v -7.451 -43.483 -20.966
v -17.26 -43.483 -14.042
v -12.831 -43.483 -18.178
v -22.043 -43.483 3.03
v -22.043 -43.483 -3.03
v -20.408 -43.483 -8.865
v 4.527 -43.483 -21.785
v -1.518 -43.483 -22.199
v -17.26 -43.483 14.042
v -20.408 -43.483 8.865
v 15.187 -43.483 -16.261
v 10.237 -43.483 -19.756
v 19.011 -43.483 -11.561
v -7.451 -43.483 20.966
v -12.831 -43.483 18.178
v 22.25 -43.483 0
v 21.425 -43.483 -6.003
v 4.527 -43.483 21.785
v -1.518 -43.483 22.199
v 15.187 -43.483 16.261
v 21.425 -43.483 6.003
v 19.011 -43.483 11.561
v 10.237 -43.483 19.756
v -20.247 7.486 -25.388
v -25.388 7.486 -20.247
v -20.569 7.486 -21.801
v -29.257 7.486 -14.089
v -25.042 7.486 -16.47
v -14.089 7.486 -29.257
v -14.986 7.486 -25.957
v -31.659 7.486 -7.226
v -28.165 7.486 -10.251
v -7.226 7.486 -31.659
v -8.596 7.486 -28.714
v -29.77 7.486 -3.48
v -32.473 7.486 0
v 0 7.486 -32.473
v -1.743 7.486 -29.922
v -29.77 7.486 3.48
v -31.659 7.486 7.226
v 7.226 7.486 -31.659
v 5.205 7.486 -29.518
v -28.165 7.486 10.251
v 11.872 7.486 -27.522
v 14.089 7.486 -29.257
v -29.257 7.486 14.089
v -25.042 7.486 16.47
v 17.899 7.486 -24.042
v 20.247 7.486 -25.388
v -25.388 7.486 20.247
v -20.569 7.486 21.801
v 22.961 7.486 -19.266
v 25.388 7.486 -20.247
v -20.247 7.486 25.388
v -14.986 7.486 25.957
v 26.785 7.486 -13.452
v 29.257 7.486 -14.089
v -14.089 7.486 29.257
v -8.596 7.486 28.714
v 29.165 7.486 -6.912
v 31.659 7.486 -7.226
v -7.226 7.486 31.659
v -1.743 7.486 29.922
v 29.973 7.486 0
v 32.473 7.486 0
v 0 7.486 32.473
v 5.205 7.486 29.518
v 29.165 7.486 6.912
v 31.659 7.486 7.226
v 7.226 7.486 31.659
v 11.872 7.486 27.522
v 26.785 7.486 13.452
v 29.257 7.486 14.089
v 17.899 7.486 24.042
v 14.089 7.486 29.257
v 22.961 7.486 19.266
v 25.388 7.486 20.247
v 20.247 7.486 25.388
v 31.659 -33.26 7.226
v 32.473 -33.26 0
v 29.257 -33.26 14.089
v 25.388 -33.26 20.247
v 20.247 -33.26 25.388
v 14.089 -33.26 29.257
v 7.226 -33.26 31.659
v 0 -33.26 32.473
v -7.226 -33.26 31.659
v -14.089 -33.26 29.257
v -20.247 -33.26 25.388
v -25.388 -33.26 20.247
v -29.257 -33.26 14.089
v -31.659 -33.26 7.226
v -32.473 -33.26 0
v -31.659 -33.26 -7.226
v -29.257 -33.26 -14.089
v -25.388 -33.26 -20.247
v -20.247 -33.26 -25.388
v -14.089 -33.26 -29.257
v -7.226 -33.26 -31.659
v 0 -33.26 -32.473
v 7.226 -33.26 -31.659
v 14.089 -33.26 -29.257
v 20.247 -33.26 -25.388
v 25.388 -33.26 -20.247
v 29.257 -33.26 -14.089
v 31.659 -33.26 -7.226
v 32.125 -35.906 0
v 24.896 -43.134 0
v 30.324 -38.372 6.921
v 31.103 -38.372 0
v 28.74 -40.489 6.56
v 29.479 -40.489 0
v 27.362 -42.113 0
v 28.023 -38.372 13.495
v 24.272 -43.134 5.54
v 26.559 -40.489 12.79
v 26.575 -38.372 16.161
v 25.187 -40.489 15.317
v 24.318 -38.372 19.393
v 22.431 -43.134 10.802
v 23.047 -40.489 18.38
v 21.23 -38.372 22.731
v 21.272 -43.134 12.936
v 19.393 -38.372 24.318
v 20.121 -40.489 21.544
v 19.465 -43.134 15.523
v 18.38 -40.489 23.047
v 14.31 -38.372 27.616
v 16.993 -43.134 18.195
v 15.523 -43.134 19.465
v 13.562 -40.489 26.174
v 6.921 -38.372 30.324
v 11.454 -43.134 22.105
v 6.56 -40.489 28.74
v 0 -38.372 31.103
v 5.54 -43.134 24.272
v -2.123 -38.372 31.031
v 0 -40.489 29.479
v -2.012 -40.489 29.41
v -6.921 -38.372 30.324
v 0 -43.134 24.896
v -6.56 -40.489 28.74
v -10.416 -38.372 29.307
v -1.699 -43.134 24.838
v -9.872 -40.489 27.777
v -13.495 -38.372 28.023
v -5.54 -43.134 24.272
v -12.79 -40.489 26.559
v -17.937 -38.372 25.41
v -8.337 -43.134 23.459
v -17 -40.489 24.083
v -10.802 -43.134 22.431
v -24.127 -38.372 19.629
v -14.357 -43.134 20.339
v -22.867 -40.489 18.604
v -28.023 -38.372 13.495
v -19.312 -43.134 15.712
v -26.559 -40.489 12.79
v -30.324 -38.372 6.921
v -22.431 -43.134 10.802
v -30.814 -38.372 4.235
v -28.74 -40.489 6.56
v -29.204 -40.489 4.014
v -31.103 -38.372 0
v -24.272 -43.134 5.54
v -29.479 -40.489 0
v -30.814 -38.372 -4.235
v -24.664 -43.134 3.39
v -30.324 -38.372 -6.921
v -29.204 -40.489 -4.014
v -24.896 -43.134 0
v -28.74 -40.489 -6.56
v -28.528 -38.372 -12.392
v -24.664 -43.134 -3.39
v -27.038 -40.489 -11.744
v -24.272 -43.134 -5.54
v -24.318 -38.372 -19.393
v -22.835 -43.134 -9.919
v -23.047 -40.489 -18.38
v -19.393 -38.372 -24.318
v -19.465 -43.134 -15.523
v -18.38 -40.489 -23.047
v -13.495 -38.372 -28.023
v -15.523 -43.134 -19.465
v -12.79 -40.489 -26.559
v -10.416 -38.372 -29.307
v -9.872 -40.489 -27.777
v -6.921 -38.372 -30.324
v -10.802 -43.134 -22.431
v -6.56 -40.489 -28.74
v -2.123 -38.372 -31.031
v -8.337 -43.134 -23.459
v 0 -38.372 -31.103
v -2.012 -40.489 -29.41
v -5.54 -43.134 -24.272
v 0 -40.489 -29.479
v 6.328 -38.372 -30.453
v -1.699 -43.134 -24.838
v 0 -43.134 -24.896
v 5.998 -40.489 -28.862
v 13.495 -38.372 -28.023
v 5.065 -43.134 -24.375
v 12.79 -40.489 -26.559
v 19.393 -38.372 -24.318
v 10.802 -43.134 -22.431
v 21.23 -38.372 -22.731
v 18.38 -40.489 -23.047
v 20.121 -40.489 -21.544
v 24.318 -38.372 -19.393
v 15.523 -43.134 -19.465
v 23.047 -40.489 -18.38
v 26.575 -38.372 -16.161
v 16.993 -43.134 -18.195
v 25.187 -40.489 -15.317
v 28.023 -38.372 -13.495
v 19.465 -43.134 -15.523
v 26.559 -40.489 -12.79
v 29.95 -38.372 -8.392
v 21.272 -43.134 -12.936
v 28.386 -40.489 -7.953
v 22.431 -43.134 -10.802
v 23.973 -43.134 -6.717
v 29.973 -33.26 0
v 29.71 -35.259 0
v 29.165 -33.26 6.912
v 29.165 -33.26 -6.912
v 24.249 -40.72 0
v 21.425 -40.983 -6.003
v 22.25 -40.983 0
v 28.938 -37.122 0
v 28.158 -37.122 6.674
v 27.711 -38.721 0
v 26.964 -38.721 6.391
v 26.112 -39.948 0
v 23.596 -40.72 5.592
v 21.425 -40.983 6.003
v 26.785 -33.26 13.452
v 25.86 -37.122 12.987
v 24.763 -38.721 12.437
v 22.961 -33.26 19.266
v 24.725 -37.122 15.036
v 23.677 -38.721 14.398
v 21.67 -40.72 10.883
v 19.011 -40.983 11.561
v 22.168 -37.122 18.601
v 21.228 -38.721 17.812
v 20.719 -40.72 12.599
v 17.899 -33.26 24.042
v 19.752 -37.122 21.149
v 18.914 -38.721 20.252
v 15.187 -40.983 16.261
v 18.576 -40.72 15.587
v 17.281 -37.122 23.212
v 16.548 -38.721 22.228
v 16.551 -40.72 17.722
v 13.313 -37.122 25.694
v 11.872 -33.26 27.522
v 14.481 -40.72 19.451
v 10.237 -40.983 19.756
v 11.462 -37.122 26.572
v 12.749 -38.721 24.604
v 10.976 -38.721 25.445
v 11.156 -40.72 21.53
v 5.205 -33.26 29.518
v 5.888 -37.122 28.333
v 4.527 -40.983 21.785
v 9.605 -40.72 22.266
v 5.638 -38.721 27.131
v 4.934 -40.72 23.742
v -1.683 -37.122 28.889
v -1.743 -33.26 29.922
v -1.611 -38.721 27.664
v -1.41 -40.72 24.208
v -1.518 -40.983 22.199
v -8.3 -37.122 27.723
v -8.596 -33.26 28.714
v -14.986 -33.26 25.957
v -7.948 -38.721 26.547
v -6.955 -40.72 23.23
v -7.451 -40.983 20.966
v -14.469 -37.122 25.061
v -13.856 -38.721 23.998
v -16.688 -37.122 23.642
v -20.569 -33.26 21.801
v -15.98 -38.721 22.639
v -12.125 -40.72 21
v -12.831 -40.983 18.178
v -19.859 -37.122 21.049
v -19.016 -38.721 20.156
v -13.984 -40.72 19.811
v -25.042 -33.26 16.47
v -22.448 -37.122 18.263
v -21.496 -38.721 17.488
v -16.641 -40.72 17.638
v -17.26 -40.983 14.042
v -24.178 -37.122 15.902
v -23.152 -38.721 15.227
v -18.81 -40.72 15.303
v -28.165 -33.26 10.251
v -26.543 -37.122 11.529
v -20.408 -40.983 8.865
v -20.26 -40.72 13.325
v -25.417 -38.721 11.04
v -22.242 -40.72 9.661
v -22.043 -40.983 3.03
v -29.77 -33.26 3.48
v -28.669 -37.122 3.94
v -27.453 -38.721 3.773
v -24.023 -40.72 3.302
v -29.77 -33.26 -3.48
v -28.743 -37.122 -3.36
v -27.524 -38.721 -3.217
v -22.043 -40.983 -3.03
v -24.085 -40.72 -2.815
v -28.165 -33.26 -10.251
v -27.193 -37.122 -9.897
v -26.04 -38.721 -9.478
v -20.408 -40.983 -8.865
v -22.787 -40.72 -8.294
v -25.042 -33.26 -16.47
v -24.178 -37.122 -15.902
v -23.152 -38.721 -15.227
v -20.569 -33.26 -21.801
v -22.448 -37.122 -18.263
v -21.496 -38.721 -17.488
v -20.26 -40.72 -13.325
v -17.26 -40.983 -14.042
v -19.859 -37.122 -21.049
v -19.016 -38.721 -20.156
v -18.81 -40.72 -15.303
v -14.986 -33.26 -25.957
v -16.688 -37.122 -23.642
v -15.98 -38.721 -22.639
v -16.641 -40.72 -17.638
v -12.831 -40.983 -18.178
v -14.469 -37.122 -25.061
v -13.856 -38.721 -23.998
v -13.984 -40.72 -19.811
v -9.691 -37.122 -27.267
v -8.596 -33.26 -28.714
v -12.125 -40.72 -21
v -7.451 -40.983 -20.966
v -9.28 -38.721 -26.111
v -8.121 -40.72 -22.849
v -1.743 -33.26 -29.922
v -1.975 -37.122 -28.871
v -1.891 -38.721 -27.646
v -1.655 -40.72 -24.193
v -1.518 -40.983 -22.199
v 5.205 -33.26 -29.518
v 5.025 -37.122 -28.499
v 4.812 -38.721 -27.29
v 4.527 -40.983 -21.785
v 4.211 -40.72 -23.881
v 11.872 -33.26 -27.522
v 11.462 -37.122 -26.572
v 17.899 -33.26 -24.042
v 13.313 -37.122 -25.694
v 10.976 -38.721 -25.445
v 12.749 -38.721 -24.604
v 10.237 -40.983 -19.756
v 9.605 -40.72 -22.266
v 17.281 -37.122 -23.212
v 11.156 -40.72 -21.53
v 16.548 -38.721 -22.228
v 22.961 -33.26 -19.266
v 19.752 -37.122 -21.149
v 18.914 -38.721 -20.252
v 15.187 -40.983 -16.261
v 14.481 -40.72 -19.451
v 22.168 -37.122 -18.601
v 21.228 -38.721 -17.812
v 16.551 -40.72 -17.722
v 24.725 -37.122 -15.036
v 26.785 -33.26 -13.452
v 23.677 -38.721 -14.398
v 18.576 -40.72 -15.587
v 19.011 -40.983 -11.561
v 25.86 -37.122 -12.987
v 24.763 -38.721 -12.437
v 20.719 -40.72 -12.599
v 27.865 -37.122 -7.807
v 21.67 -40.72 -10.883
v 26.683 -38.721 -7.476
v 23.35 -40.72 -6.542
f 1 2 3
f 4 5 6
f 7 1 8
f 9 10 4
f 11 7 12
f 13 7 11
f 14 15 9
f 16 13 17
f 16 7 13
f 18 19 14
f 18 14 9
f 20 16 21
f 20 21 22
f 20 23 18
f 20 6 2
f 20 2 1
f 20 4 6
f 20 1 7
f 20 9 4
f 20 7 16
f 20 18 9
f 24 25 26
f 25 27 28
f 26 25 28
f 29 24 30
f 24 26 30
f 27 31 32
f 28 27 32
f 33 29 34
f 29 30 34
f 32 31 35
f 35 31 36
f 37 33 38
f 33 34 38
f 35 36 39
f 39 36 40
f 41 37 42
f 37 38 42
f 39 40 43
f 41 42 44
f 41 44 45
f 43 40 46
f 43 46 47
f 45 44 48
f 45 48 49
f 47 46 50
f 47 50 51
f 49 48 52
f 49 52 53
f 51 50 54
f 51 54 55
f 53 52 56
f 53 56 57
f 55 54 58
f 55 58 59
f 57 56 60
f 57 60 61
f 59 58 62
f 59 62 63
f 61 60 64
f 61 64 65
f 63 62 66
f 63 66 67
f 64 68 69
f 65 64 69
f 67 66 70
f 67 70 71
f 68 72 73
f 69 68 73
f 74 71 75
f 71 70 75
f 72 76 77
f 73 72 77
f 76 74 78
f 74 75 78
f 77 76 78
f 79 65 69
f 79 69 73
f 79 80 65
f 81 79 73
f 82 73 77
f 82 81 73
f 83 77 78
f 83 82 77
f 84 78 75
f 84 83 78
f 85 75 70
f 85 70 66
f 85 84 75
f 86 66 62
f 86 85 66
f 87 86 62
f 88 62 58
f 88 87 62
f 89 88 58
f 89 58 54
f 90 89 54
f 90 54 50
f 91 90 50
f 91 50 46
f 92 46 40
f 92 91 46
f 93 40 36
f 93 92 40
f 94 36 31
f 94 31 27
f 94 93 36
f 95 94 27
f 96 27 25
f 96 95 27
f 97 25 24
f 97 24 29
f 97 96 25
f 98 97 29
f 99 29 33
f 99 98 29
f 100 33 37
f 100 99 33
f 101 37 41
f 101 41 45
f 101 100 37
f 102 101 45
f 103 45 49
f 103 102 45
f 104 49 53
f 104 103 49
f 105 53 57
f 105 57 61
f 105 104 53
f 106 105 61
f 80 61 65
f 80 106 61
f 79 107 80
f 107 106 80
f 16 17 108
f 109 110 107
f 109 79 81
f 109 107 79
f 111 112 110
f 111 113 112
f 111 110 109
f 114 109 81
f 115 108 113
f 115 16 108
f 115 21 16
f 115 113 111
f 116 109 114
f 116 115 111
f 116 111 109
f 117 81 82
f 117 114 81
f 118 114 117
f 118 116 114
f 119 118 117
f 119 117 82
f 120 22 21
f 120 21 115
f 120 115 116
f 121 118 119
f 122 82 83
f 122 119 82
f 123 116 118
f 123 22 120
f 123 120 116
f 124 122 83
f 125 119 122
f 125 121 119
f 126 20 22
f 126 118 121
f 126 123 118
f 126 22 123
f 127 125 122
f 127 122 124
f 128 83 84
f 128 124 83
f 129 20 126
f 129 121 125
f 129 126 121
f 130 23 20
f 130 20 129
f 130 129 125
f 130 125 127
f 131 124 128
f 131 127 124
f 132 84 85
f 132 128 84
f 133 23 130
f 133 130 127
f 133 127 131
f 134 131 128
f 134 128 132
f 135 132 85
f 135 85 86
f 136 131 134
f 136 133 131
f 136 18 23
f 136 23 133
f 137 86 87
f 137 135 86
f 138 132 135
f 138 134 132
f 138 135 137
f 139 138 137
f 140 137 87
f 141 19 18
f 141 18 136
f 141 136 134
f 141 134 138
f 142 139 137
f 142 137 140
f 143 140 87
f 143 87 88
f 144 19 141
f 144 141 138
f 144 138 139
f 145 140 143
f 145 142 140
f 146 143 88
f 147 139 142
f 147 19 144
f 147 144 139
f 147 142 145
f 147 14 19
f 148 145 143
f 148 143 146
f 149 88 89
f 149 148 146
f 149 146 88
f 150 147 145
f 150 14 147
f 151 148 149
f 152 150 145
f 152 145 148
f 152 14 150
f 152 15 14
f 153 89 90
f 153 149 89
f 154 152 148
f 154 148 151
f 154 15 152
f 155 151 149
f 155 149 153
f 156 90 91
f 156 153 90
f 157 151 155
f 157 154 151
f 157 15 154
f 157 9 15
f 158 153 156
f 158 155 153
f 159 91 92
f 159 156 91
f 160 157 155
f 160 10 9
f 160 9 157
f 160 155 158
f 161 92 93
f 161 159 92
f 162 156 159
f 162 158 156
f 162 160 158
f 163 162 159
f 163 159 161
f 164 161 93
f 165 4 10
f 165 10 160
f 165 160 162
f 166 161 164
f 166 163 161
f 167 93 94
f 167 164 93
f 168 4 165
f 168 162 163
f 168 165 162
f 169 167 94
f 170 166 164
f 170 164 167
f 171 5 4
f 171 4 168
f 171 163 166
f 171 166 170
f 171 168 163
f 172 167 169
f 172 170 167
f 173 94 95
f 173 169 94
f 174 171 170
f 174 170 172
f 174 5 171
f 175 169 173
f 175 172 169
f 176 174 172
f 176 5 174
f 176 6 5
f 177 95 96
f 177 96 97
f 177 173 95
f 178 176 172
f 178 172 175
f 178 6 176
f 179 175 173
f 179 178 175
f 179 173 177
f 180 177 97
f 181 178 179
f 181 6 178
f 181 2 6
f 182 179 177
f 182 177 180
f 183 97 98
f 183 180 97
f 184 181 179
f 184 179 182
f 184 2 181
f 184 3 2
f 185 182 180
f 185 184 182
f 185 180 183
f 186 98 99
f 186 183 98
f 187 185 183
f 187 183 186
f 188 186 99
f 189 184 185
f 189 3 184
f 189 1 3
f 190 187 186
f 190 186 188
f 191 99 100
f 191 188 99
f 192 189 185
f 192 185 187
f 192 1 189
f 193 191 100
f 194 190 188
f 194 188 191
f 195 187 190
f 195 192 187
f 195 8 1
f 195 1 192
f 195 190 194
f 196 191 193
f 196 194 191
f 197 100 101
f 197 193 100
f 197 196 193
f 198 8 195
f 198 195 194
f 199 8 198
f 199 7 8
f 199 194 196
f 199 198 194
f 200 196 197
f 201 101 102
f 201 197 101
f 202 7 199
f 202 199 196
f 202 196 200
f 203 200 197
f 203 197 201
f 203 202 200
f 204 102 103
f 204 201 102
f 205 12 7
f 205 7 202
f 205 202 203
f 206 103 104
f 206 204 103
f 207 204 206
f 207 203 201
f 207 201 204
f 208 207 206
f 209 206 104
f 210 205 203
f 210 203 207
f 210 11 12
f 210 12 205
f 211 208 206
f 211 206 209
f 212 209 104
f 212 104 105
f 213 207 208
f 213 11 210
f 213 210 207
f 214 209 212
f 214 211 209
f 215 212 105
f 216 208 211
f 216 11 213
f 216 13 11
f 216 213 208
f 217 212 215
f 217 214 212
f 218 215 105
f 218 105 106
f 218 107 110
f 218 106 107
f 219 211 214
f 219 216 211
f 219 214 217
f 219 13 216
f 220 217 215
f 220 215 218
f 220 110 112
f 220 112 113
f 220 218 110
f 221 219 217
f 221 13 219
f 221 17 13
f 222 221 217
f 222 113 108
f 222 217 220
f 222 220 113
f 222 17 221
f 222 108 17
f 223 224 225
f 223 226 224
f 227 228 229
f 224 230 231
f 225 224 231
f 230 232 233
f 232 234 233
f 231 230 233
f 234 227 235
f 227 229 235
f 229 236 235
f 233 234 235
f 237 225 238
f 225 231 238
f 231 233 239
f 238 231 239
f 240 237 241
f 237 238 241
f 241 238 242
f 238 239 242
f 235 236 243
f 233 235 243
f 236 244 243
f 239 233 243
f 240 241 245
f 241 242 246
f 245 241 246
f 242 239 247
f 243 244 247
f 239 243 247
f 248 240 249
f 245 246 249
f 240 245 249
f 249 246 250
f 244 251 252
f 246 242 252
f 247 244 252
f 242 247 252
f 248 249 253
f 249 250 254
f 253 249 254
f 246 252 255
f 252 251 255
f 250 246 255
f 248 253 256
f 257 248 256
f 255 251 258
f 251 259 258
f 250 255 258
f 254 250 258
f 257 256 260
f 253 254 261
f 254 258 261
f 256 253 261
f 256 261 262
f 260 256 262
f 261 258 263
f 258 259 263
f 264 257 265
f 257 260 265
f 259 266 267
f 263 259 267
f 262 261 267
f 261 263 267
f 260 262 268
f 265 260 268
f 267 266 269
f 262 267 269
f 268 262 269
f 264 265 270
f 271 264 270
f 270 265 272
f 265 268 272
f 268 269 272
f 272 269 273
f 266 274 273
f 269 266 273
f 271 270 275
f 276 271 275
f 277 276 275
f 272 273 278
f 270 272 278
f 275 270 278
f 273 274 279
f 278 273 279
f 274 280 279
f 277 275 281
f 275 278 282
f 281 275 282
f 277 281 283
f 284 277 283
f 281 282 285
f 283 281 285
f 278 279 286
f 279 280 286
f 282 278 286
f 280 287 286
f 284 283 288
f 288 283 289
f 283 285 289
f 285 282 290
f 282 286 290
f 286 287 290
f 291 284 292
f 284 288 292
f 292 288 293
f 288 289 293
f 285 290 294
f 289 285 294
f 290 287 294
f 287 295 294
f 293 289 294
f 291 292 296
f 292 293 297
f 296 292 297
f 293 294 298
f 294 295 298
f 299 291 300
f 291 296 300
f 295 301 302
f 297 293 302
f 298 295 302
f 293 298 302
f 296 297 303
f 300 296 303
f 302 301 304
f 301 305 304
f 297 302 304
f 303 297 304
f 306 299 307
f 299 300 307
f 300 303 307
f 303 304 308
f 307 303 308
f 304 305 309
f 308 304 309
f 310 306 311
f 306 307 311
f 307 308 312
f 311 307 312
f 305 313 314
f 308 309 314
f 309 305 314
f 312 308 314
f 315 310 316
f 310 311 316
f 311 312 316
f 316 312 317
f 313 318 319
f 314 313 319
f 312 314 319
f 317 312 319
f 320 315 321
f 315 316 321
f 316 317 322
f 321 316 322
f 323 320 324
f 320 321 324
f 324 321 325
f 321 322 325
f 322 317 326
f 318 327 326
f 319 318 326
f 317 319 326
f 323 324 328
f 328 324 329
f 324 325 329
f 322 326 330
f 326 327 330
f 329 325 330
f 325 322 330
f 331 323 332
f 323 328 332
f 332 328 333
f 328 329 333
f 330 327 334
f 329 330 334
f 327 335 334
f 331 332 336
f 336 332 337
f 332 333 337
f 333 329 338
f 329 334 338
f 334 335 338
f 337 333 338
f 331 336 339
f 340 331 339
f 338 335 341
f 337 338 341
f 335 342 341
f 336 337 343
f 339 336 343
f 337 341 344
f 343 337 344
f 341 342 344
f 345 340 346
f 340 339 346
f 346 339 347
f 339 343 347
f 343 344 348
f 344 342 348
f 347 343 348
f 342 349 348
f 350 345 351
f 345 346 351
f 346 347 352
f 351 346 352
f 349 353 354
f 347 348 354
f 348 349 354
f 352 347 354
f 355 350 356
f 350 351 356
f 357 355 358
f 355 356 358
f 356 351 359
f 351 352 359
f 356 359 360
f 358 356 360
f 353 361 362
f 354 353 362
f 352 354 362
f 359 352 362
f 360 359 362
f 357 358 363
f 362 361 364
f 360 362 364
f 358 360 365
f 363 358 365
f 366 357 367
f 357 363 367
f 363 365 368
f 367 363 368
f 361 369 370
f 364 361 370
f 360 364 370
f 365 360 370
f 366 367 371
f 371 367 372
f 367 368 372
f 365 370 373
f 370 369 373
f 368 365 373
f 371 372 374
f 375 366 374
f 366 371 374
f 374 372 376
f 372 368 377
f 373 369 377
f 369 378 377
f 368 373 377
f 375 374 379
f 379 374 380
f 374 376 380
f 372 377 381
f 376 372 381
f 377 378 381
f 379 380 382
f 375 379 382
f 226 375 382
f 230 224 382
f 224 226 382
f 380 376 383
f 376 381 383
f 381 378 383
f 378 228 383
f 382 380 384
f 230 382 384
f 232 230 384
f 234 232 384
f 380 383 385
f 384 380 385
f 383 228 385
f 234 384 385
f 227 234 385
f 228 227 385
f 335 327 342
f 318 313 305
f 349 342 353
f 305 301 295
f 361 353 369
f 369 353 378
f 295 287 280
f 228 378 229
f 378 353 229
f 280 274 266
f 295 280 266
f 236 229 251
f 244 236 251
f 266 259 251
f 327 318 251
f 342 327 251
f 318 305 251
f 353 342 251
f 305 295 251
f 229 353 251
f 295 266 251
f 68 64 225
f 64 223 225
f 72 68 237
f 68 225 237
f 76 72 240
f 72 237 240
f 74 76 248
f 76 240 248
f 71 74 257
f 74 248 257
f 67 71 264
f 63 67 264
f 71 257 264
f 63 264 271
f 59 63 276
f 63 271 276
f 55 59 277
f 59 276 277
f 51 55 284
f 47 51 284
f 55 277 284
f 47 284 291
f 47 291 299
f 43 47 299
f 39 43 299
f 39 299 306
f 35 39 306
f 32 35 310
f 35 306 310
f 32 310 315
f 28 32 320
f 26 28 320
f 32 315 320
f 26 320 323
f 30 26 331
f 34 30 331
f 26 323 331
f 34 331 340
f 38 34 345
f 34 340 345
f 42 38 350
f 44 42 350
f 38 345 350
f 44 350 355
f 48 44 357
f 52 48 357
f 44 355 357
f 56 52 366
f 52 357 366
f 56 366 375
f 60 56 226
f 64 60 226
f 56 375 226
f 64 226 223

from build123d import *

# Parameters (mm, degrees)
F0_R          = 32.4728683354
F1_DEPTH      = 18.48277
F1_DEPTH_BACK = 25
F2_R          = 10.2224079186
F3_T          = -2.5
F5_DEPTH      = 7.48645


with BuildPart() as f1:
    # F0 (on Front) → F1 (new body, two sides)
    with BuildSketch(Plane.XZ) as f1_sk:
        Circle(F0_R)
    extrude(amount=F1_DEPTH)
    extrude(f1_sk.sketch, amount=-F1_DEPTH_BACK)

    # F2
    f2_edges = [f1.edges().sort_by_distance(p)[0] for p in [
        (-32.472868, -18.48277, 0),
    ]]
    fillet(f2_edges, radius=F2_R)

    # F3
    f3_openings = [f1.faces().sort_by_distance(p)[0] for p in [
        (0, 25, 0),
    ]]
    offset(amount=F3_T, openings=f3_openings)


with BuildPart() as f1_1:
    # F4: moved
    add(f1.part.moved(Location((0, -25, 0))))

    # F5 (add): a face of the model
    f5_faces = [f1_1.faces().sort_by_distance(p)[0] for p in [
        (-31.5543969192, 0, 0),
    ]]
    extrude(f5_faces, amount=F5_DEPTH)


solid = f1_1.part
